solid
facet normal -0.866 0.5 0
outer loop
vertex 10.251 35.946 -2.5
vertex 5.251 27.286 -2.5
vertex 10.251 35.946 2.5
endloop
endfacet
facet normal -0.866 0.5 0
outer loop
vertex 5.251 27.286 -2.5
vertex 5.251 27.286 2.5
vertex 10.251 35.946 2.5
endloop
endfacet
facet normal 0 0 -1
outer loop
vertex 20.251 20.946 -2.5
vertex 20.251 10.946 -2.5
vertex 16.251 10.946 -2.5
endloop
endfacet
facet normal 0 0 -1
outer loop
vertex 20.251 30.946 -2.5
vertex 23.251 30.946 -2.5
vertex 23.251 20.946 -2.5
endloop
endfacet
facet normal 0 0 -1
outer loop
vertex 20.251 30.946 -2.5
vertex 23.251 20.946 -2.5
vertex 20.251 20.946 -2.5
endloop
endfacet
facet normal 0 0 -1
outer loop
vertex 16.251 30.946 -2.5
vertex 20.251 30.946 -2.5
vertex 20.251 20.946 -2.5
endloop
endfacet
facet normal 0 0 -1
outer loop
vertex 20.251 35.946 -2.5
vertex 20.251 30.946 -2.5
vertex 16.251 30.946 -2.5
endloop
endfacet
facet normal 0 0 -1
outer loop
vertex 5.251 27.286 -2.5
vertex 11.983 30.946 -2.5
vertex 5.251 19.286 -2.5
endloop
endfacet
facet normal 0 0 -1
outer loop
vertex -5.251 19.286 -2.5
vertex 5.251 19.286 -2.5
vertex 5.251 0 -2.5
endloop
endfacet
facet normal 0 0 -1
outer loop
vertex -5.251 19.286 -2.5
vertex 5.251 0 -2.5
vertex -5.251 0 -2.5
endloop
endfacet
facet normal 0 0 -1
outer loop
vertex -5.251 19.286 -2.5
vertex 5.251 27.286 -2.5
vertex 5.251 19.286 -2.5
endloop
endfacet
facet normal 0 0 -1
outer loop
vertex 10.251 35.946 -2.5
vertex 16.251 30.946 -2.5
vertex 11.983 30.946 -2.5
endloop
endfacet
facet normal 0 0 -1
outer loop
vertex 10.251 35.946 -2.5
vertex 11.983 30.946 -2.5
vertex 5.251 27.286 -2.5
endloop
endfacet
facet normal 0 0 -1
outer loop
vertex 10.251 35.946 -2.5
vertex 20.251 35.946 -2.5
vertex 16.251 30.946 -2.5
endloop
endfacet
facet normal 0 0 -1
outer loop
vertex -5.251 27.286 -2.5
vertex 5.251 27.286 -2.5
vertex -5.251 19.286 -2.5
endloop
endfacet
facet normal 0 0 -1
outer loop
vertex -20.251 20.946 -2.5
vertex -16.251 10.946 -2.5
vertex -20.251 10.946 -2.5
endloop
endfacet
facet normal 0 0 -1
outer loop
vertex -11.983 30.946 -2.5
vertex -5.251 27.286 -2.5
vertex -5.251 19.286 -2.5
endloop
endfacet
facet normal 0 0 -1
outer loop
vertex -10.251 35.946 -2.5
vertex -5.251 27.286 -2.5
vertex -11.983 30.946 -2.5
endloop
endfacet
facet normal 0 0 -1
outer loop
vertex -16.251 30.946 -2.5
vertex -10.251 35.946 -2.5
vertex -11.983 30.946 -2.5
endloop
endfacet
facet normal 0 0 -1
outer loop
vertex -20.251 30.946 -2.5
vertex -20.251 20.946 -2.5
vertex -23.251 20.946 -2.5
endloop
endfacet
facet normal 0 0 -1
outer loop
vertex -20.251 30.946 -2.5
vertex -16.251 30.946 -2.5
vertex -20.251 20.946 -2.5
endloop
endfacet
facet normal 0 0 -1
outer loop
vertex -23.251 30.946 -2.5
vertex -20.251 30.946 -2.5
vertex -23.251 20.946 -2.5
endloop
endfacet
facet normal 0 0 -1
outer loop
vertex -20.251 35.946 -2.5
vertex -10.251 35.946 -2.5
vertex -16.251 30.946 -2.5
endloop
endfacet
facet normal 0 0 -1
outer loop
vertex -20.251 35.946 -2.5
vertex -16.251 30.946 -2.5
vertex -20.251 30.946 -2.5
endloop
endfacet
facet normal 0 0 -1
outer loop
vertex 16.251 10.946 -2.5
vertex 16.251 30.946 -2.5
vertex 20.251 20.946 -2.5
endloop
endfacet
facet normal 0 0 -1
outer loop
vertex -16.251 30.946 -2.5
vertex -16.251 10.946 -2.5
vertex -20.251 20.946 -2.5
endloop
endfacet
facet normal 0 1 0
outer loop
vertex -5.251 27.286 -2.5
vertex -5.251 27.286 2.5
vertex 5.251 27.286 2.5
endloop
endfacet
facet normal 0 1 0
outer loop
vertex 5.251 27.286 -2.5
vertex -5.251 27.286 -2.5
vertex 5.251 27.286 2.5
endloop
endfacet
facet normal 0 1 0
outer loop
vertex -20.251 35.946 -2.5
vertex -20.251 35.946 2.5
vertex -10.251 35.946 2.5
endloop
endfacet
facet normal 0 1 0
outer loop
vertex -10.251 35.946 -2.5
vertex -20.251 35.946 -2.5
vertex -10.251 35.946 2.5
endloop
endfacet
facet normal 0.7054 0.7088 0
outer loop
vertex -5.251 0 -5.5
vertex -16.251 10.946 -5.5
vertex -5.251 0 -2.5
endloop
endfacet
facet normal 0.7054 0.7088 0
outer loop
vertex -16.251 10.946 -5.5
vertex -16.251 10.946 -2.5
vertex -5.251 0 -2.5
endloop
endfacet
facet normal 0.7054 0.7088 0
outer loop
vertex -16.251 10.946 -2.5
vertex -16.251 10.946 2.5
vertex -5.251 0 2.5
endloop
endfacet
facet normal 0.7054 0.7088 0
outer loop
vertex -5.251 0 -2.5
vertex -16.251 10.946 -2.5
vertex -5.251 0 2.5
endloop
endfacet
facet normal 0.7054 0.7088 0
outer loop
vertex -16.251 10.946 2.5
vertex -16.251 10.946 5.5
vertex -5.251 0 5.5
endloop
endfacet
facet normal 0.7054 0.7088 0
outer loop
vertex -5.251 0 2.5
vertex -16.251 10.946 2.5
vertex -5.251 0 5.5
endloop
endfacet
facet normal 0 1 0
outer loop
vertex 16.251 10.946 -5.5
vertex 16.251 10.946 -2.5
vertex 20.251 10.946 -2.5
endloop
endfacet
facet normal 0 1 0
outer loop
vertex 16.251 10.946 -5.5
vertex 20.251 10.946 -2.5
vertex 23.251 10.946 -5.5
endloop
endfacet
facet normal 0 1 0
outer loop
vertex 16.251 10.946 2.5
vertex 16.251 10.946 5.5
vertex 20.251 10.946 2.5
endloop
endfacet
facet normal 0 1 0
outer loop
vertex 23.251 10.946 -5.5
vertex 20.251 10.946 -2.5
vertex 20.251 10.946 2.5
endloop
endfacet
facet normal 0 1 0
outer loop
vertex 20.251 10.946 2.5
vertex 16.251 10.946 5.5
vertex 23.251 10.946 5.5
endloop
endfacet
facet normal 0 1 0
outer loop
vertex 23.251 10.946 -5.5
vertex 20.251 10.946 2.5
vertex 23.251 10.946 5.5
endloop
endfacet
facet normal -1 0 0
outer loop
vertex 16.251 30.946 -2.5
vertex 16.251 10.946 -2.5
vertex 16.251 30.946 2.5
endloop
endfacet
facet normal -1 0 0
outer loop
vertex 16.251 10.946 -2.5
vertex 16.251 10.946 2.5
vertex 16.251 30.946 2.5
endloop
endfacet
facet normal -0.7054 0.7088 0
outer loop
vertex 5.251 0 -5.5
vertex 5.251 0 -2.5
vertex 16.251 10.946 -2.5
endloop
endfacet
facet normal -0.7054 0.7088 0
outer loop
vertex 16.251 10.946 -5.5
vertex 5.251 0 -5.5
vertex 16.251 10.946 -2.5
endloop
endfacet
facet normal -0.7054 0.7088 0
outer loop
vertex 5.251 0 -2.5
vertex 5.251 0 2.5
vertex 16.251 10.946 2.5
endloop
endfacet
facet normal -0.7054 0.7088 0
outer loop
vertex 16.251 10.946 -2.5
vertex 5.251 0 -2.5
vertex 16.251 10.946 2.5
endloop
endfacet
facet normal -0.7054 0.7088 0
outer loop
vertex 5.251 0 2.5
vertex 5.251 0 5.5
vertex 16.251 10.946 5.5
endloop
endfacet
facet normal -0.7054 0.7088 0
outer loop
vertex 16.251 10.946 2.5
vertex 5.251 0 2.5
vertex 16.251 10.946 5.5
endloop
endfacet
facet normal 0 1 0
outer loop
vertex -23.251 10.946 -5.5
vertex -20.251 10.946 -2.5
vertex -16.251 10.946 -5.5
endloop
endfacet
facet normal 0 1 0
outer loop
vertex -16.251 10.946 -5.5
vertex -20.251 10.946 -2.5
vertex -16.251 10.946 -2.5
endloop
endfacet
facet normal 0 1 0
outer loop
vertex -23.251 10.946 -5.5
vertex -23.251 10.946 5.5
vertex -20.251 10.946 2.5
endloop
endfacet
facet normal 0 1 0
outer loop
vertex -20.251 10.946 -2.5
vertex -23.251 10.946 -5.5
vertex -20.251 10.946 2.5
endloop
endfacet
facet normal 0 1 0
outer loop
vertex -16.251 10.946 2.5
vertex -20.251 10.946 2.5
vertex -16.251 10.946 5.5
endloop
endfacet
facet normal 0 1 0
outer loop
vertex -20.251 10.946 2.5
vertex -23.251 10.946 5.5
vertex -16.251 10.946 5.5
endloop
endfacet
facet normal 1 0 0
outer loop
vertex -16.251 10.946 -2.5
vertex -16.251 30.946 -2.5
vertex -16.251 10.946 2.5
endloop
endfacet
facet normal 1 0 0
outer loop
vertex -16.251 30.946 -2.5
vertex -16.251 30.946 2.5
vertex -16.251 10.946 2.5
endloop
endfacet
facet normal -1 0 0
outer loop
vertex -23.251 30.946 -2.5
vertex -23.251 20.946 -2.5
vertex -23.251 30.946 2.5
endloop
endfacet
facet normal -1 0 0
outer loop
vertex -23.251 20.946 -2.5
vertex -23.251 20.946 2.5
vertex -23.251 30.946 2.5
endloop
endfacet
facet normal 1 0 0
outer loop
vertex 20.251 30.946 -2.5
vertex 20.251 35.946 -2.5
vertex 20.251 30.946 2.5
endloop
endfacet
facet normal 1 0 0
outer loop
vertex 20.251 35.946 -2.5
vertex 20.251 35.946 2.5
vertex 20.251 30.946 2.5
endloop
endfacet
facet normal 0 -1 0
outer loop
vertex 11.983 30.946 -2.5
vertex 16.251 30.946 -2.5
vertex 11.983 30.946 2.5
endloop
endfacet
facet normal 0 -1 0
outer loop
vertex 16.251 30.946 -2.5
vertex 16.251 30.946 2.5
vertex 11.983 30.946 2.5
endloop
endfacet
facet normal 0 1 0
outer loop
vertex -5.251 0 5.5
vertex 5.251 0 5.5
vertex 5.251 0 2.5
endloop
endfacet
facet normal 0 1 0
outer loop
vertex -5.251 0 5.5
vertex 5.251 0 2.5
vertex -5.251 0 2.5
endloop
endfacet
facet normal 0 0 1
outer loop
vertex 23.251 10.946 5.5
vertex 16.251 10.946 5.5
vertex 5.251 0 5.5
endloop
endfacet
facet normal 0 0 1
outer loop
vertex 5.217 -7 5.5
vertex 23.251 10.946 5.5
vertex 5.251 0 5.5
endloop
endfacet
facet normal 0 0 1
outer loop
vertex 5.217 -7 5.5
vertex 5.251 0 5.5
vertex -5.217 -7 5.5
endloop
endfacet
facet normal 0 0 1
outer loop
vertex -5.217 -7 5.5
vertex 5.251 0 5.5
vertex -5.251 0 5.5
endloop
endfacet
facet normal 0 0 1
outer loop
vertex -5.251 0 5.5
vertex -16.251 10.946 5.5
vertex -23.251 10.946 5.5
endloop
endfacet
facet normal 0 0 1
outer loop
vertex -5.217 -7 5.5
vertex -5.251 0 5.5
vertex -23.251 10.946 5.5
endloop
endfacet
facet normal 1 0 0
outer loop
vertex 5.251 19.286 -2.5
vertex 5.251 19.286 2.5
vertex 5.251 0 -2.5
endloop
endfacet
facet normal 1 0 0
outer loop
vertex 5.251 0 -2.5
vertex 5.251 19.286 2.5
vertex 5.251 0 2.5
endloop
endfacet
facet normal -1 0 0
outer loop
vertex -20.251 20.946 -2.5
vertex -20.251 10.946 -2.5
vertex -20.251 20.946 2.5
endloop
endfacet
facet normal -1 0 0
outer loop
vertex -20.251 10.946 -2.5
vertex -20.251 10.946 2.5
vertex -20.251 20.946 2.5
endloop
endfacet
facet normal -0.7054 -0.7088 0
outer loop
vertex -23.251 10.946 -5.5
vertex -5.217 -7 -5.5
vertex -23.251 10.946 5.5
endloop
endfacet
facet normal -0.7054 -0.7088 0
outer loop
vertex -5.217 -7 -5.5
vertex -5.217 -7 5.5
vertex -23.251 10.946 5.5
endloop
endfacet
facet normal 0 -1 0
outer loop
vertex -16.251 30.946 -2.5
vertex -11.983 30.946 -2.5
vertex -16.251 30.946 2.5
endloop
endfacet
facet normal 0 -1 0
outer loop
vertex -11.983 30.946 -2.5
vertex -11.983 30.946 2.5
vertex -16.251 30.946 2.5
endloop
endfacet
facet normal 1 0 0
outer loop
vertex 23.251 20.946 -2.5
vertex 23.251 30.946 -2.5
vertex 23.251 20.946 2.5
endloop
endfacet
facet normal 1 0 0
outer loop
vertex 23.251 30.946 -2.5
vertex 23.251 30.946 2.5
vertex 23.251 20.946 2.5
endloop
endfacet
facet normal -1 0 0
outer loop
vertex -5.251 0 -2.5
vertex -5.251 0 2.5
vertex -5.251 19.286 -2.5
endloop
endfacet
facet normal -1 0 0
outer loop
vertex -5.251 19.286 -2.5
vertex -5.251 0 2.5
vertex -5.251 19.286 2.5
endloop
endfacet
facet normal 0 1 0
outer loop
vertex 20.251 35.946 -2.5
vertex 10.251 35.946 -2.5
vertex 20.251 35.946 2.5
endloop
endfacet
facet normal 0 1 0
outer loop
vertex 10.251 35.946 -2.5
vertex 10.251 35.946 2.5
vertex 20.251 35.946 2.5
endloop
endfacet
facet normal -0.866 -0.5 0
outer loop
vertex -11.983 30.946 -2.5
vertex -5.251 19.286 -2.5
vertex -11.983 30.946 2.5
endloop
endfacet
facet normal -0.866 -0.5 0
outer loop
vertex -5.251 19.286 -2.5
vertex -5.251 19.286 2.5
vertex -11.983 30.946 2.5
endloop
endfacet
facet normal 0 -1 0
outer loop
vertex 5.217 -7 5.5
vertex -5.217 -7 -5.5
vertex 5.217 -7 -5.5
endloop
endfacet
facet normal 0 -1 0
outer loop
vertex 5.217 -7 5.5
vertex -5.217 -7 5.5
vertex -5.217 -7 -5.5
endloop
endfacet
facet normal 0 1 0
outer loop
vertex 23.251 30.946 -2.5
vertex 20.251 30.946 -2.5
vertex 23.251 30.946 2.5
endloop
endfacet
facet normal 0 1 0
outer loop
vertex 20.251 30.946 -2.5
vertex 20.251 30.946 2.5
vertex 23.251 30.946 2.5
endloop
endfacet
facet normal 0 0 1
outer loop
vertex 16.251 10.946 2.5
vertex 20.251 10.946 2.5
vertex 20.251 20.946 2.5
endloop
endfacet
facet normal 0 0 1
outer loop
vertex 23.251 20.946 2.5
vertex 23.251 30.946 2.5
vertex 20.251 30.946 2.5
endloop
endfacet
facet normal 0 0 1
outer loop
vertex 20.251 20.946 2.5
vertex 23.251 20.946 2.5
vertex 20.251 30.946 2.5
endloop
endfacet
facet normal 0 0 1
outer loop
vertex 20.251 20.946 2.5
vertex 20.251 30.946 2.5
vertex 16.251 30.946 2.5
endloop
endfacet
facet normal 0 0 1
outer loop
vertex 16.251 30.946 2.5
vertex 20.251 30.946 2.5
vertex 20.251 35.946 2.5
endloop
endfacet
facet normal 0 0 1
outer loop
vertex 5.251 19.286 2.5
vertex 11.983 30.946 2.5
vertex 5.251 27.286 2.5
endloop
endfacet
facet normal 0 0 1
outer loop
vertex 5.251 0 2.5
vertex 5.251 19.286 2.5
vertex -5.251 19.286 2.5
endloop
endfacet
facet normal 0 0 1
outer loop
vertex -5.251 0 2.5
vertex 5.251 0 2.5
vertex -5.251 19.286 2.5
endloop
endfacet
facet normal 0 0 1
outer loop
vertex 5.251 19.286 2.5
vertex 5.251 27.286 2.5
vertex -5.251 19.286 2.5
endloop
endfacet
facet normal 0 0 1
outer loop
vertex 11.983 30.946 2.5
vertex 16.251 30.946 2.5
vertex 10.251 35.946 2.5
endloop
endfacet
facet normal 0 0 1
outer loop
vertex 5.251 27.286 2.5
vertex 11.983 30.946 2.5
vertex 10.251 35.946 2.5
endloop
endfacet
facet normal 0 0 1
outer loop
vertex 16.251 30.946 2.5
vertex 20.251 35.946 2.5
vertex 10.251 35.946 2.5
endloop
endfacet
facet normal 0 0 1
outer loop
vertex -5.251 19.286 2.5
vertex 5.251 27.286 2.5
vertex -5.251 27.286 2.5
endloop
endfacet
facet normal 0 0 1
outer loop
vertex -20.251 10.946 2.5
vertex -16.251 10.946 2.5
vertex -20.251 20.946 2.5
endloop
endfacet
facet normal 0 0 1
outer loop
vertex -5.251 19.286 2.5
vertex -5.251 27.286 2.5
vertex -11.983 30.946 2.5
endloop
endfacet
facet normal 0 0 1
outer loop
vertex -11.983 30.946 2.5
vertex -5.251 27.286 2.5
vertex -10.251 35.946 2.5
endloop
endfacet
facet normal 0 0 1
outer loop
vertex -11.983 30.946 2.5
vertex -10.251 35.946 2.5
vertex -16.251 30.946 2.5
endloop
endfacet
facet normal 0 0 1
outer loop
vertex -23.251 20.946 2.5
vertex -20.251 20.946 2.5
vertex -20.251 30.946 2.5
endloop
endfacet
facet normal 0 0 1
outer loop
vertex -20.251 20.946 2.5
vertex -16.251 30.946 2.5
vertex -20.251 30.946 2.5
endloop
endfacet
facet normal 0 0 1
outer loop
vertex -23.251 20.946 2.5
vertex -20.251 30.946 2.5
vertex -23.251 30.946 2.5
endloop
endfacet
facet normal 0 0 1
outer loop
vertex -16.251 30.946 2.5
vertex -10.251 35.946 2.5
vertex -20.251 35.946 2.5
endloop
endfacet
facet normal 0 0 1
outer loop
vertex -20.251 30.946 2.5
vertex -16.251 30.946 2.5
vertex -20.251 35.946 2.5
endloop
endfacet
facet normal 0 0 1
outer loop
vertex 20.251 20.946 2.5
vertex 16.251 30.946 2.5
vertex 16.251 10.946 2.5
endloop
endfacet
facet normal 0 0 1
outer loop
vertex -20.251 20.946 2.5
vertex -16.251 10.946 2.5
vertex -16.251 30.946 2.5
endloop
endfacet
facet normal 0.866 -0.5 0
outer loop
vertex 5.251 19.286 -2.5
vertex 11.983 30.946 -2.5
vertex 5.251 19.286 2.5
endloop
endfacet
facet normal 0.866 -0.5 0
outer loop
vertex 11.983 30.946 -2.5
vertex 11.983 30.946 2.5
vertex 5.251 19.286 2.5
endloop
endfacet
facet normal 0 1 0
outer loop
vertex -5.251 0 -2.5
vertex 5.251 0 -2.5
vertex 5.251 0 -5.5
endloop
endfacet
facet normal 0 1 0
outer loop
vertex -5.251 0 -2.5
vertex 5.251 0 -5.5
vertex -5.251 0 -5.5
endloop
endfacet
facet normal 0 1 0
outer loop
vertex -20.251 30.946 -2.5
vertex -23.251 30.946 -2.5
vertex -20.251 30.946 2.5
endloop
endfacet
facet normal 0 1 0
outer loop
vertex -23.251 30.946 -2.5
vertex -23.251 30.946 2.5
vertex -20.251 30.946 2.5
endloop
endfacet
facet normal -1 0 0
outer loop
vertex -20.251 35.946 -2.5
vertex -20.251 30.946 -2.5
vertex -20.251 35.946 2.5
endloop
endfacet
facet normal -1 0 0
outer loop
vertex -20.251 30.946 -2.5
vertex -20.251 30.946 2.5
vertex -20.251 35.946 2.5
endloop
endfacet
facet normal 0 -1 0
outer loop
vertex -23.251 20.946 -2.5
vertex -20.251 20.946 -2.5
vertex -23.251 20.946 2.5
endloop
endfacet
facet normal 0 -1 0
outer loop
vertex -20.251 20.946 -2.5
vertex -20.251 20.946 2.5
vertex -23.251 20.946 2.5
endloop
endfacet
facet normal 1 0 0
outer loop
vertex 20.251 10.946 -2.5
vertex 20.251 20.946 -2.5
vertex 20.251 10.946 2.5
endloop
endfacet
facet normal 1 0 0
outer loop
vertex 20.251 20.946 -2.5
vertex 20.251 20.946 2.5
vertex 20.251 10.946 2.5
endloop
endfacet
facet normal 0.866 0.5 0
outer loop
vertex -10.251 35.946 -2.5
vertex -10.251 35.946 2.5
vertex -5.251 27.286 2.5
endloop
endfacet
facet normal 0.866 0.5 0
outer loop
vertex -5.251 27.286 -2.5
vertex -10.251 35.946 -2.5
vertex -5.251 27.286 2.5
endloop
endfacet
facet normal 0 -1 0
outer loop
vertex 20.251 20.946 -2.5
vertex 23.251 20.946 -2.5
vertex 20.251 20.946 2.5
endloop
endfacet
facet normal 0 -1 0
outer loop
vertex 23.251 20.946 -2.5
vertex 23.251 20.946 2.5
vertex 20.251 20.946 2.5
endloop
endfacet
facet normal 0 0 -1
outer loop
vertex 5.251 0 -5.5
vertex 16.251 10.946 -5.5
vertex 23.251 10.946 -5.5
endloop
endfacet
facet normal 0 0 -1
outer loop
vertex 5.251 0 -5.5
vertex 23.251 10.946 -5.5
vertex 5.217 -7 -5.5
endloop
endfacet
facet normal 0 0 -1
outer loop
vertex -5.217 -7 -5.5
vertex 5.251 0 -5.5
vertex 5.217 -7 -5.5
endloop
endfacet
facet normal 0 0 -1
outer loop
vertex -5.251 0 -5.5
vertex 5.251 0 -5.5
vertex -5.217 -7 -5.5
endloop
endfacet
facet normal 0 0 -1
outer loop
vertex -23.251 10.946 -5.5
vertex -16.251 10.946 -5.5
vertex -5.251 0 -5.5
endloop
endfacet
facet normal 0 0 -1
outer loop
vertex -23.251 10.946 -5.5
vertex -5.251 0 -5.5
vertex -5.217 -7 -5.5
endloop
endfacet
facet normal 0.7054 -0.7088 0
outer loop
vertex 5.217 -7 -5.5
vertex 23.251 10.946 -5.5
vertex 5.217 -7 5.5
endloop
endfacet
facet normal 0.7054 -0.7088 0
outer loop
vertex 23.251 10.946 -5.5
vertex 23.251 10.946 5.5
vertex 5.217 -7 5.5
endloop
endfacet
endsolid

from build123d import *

# Parameters (mm, degrees)
EXTRUDE_1_DEPTH = 2.5
EXTRUDE_2_DEPTH = 5.5


with BuildPart() as part:
    # 草图1 → 凸台-拉伸1 (new, symmetric)
    with BuildSketch(Plane.XY):
        Polygon((-5.251410484, 27.285955328), (5.251410484, 27.285955328), (10.251410484, 35.946209366), (20.251410484, 35.946209366), (20.251410484, 30.946209366), (23.251410484, 30.946209366), (23.251410484, 20.946209366), (20.251410484, 20.946209366), (20.251410484, 10.946209366), (16.251410484, 10.946209366), (16.251410484, 30.946209366), (11.983461292, 30.946209366), (5.251410484, 19.285955328), (5.251410484, 0), (0, 0), (-5.251410484, 0), (-5.251410484, 19.285955328), (-11.983461292, 30.946209366), (-16.251410484, 30.946209366), (-16.251410484, 10.946209366), (-20.251410484, 10.946209366), (-20.251410484, 20.946209366), (-23.251410484, 20.946209366), (-23.251410484, 30.946209366), (-20.251410484, 30.946209366), (-20.251410484, 35.946209366), (-10.251410484, 35.946209366), align=None)
    extrude(amount=EXTRUDE_1_DEPTH, both=True)

    # 草图2 → 凸台-拉伸2 (add, symmetric)
    with BuildSketch(Plane.XY):
        Polygon((16.251410484, 10.946209366), (23.251410484, 10.946209366), (5.21701187, -7), (0, -7), (-5.21701187, -7), (-23.251410484, 10.946209366), (-16.251410484, 10.946209366), (-5.251410484, 0), (0, 0), (5.251410484, 0), align=None)
    extrude(amount=EXTRUDE_2_DEPTH, both=True)


solid = part.part
